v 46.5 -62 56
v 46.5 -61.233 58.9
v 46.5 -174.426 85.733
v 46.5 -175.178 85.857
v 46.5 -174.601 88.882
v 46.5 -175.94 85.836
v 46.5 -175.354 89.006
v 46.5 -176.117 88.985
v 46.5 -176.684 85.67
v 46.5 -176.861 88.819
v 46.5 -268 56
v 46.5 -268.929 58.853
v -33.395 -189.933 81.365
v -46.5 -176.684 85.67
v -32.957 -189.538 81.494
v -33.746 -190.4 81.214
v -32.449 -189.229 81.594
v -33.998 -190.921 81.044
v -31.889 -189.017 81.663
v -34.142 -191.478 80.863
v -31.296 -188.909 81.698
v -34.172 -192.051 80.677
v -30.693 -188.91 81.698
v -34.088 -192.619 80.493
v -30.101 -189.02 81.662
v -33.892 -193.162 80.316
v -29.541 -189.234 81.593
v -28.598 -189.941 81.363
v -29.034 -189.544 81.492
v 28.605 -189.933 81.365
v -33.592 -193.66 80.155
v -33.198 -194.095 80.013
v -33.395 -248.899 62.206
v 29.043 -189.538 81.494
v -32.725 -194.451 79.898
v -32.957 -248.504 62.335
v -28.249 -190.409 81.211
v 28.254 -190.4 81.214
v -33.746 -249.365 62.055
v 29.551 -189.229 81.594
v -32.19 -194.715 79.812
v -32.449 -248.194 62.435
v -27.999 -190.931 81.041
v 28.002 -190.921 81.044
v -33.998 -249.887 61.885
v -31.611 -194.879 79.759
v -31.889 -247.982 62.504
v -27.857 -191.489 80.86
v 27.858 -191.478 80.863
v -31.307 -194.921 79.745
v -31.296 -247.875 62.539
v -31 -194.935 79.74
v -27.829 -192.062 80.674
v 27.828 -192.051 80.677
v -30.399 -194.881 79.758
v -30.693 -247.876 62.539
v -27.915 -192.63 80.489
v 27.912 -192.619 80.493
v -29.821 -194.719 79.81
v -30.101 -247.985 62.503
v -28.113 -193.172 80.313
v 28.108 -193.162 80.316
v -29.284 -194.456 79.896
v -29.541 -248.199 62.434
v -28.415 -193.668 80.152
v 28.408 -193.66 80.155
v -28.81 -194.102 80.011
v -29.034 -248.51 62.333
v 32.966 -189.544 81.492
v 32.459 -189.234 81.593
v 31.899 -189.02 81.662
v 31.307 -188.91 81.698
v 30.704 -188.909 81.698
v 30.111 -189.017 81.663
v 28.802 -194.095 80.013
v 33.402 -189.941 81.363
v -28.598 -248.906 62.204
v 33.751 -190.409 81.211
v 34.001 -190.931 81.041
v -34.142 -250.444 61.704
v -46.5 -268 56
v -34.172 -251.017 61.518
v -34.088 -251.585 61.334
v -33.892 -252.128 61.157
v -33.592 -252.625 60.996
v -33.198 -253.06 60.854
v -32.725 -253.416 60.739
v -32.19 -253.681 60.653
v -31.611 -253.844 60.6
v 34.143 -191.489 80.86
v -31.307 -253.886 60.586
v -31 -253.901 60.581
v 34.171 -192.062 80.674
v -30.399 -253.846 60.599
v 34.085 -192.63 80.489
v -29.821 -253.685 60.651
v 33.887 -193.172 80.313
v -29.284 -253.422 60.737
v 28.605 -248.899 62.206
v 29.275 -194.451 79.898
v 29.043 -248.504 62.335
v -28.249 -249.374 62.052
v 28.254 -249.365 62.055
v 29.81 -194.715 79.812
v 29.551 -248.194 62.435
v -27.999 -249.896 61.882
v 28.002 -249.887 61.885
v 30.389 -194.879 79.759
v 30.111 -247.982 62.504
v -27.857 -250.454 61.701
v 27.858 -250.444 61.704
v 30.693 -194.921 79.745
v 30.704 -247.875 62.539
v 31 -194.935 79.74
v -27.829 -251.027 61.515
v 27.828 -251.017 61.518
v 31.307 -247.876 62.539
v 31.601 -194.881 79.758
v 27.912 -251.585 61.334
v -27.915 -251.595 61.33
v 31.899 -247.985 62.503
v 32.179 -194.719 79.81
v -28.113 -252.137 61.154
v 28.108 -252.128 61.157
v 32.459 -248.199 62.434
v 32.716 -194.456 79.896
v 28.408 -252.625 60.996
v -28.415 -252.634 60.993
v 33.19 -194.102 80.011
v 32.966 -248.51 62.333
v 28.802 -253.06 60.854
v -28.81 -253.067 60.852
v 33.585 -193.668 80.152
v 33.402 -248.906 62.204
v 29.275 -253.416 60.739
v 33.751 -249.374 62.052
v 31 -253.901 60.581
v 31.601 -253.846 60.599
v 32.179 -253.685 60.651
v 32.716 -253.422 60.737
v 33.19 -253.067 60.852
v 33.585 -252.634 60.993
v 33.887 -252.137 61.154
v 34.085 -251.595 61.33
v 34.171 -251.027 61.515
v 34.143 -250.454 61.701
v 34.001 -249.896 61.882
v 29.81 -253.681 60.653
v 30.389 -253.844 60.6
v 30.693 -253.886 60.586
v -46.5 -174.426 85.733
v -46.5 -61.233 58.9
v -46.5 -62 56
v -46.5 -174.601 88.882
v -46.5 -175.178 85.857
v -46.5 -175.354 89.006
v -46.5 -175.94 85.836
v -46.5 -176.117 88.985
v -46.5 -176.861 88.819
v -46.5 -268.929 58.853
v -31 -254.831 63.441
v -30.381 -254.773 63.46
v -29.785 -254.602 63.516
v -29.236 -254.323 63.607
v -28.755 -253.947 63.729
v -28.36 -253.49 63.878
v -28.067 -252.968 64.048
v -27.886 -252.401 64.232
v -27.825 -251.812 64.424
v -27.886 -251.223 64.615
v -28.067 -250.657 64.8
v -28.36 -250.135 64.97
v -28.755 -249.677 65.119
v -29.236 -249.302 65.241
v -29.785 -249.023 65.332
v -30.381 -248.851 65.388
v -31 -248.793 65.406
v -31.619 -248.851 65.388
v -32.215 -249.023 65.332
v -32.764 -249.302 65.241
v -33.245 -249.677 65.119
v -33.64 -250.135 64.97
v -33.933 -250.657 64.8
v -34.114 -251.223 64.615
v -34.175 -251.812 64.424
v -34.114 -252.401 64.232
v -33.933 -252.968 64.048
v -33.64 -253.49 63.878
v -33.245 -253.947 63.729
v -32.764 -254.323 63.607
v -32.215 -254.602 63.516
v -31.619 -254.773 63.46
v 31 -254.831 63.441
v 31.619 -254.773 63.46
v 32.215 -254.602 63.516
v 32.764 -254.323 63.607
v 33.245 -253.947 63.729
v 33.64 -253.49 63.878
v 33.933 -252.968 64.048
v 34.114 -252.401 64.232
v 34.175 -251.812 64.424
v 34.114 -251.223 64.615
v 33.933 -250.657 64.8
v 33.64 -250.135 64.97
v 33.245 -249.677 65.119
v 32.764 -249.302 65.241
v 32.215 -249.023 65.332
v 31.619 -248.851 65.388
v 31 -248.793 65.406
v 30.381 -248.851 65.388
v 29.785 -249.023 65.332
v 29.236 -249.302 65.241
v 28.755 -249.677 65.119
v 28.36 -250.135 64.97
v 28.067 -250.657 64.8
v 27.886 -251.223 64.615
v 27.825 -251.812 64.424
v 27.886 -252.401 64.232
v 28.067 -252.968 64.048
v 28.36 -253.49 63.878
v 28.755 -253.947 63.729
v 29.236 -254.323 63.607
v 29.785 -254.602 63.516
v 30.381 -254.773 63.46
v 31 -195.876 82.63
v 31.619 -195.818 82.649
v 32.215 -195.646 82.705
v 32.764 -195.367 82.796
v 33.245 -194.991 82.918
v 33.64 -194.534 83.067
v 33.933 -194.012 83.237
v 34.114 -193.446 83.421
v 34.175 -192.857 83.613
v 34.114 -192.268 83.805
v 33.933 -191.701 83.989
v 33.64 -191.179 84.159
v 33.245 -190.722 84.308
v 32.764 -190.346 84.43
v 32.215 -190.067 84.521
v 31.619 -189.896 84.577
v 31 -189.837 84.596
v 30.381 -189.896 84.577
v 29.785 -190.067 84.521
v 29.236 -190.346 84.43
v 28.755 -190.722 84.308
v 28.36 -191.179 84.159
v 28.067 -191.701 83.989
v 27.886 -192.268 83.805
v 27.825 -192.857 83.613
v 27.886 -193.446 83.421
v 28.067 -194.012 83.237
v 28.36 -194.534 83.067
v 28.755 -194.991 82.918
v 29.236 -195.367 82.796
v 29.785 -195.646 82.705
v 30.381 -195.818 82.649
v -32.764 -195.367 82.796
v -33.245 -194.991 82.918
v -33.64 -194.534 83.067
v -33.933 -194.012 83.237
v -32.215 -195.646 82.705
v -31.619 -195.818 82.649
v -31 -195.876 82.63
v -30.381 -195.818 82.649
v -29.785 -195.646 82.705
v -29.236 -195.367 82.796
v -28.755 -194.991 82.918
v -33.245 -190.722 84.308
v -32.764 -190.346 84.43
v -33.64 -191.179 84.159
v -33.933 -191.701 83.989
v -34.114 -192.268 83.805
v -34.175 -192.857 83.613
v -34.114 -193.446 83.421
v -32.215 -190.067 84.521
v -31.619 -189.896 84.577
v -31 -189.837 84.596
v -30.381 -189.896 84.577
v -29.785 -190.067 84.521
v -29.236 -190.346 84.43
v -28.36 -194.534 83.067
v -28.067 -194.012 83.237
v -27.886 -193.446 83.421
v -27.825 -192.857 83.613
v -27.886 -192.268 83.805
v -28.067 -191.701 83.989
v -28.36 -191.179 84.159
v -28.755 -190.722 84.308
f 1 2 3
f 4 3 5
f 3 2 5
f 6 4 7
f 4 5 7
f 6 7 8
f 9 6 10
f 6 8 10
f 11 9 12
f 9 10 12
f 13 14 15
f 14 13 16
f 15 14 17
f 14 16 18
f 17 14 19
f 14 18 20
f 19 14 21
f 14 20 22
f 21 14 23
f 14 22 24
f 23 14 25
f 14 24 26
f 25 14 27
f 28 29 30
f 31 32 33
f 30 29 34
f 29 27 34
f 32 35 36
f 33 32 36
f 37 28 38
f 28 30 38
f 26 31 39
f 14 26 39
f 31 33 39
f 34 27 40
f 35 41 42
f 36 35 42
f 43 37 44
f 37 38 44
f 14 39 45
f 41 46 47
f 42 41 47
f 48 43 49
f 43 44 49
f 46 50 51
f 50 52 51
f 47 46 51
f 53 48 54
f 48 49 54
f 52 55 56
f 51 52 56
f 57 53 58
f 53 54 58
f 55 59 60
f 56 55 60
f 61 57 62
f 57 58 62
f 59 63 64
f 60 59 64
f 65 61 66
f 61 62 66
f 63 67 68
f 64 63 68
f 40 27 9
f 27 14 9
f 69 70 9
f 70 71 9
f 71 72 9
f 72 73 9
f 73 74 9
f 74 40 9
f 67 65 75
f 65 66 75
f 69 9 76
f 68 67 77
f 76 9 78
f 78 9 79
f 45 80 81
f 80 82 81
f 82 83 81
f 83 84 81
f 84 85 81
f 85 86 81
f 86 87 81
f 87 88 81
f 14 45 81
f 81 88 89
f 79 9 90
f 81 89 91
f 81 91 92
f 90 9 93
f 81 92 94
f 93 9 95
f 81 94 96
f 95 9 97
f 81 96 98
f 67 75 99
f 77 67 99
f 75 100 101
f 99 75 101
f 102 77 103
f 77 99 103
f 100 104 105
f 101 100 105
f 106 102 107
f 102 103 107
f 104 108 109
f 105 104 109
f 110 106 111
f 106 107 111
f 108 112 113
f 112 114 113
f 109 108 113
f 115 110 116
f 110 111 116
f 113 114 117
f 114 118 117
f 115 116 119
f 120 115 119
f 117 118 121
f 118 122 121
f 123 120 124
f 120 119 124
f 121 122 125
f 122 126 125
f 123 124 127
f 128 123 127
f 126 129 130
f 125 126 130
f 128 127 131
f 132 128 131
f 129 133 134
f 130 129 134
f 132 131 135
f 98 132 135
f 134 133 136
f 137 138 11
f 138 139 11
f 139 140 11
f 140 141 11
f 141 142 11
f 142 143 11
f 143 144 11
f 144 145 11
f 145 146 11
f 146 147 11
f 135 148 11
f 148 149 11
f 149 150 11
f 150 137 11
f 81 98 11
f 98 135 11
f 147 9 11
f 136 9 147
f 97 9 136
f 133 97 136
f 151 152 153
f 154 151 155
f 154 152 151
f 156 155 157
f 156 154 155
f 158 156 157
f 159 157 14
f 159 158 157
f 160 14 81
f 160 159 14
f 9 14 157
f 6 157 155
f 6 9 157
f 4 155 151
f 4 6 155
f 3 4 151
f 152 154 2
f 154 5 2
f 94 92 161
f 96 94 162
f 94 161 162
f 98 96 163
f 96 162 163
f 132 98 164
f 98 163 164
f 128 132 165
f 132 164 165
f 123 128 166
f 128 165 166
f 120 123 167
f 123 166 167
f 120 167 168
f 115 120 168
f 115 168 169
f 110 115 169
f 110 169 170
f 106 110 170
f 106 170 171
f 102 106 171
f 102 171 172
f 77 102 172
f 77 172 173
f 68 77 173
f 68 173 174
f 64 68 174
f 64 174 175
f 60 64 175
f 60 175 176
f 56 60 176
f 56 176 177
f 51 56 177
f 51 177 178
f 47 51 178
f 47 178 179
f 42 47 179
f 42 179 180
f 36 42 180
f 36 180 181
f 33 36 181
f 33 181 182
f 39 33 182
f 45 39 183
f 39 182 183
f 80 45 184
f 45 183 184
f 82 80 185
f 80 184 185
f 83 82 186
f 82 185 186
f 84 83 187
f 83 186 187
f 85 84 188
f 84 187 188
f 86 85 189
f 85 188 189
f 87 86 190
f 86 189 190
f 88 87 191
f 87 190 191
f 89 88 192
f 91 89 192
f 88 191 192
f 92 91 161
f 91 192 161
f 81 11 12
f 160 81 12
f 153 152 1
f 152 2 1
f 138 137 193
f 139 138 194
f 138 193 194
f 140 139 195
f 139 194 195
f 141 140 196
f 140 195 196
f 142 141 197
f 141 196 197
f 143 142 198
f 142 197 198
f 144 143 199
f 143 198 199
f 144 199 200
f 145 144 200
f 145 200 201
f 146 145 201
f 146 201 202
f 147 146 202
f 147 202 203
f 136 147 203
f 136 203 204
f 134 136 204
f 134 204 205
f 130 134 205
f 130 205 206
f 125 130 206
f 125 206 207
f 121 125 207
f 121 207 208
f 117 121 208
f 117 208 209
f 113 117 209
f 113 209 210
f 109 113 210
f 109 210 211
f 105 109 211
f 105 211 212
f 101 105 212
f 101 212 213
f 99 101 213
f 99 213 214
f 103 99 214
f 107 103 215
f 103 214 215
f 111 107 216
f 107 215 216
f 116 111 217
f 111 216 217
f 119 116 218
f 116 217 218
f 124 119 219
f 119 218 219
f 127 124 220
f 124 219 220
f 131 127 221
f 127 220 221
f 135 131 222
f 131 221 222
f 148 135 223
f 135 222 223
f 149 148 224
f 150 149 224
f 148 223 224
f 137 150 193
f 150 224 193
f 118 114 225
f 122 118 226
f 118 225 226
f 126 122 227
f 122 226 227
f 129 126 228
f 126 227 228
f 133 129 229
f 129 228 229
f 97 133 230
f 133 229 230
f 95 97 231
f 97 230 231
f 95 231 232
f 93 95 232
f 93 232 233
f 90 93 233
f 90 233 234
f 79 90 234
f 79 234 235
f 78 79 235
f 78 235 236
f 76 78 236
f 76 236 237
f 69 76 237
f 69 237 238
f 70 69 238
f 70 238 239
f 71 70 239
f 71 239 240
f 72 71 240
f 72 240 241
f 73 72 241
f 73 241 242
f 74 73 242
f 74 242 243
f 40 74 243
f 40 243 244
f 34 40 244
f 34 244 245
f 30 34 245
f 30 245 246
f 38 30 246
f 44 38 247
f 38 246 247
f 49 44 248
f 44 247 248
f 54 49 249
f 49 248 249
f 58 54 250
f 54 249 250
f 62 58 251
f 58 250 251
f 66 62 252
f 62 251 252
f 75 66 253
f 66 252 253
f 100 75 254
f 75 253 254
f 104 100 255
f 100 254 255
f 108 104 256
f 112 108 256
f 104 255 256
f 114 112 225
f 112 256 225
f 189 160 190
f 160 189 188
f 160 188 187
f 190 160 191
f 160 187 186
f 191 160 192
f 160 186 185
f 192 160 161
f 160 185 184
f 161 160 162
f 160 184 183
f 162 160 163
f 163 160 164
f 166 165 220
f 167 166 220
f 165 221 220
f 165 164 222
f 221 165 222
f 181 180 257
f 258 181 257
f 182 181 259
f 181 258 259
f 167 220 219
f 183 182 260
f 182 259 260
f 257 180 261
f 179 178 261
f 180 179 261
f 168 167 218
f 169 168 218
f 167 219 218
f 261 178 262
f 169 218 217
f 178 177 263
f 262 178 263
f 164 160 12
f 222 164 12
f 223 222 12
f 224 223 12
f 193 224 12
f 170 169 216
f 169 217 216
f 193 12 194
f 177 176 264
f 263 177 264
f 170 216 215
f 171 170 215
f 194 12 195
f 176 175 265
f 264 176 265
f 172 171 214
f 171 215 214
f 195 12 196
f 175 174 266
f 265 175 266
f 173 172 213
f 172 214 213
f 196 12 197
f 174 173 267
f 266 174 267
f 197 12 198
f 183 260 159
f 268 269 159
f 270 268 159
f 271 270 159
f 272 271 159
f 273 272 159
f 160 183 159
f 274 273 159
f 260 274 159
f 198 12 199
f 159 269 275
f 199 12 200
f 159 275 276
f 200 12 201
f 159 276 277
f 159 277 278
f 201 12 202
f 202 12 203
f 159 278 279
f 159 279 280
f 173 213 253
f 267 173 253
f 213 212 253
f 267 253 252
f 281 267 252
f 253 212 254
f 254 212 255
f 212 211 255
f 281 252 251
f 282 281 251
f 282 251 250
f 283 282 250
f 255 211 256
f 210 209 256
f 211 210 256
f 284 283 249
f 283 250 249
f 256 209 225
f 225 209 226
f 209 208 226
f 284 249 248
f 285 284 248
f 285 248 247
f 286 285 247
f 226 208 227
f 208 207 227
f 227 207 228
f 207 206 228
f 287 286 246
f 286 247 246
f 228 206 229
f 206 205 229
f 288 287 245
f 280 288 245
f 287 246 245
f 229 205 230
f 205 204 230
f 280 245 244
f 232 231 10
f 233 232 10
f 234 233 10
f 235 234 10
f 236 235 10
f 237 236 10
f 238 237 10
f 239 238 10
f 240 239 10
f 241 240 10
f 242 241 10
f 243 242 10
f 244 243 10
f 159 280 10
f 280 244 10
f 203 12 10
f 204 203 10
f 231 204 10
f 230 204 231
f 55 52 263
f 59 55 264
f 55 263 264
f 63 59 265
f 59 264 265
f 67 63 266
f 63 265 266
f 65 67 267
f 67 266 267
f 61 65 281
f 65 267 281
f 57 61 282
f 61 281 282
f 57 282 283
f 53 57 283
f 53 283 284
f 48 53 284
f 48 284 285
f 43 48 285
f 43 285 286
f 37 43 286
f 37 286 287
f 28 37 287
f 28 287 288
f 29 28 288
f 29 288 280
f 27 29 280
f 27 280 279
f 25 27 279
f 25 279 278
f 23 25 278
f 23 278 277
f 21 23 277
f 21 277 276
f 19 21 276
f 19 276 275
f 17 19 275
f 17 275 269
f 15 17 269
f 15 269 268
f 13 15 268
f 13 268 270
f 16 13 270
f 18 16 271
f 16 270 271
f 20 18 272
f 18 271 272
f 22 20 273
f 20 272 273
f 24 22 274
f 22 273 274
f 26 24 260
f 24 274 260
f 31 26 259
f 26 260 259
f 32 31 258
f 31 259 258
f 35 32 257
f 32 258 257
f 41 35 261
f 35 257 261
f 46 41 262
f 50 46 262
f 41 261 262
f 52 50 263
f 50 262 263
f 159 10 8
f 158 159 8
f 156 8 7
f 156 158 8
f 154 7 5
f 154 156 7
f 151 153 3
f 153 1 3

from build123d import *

# Parameters (mm, degrees)
PAD015_DEPTH    = 46.5
SKETCH024_R     = 3.175
POCKET016_DEPTH = 4
FILLET007_R     = 4


with BuildPart() as part:
    # Sketch043 → Pad015 (new body, symmetric)
    with BuildSketch(Plane.YZ):
        Polygon((-268, 55), (-268.9285051775, 57.8526966427), (-175.7404148487, 88.1838657739), (-61.2329665245, 57.900286132), (-62, 55), (-175.5643554306, 85.0341615546), align=None)
    extrude(amount=PAD015_DEPTH, both=True)

    # Sketch024 (on Face2 of Pad015) → Pocket016 (cut)
    with BuildSketch(Plane(origin=(0, -42.7873449396, 131.4578725241), x_dir=(0, -0.9508988809, -0.3095017258), z_dir=(0, -0.3095017258, 0.9508988809))):
        with Locations((157.8183051623, -31)):
            Circle(SKETCH024_R)
        with Locations((157.8183051623, 31)):
            Circle(SKETCH024_R)
        with Locations((219.8183051623, 31)):
            Circle(SKETCH024_R)
        with Locations((219.8183051623, -31)):
            Circle(SKETCH024_R)
    extrude(amount=-POCKET016_DEPTH, mode=Mode.SUBTRACT)

    # Fillet007
    fillet007_edges = [part.edges().sort_by_distance(p)[0] for p in [
        (0, -175.740415, 88.183866),
        (0, -175.564355, 85.034162),
    ]]
    fillet(fillet007_edges, radius=FILLET007_R)


with BuildPart() as part_1:
    # Body009 placement: moved
    add(part.part.moved(Location((0, 0, 1))))


solid = part_1.part
